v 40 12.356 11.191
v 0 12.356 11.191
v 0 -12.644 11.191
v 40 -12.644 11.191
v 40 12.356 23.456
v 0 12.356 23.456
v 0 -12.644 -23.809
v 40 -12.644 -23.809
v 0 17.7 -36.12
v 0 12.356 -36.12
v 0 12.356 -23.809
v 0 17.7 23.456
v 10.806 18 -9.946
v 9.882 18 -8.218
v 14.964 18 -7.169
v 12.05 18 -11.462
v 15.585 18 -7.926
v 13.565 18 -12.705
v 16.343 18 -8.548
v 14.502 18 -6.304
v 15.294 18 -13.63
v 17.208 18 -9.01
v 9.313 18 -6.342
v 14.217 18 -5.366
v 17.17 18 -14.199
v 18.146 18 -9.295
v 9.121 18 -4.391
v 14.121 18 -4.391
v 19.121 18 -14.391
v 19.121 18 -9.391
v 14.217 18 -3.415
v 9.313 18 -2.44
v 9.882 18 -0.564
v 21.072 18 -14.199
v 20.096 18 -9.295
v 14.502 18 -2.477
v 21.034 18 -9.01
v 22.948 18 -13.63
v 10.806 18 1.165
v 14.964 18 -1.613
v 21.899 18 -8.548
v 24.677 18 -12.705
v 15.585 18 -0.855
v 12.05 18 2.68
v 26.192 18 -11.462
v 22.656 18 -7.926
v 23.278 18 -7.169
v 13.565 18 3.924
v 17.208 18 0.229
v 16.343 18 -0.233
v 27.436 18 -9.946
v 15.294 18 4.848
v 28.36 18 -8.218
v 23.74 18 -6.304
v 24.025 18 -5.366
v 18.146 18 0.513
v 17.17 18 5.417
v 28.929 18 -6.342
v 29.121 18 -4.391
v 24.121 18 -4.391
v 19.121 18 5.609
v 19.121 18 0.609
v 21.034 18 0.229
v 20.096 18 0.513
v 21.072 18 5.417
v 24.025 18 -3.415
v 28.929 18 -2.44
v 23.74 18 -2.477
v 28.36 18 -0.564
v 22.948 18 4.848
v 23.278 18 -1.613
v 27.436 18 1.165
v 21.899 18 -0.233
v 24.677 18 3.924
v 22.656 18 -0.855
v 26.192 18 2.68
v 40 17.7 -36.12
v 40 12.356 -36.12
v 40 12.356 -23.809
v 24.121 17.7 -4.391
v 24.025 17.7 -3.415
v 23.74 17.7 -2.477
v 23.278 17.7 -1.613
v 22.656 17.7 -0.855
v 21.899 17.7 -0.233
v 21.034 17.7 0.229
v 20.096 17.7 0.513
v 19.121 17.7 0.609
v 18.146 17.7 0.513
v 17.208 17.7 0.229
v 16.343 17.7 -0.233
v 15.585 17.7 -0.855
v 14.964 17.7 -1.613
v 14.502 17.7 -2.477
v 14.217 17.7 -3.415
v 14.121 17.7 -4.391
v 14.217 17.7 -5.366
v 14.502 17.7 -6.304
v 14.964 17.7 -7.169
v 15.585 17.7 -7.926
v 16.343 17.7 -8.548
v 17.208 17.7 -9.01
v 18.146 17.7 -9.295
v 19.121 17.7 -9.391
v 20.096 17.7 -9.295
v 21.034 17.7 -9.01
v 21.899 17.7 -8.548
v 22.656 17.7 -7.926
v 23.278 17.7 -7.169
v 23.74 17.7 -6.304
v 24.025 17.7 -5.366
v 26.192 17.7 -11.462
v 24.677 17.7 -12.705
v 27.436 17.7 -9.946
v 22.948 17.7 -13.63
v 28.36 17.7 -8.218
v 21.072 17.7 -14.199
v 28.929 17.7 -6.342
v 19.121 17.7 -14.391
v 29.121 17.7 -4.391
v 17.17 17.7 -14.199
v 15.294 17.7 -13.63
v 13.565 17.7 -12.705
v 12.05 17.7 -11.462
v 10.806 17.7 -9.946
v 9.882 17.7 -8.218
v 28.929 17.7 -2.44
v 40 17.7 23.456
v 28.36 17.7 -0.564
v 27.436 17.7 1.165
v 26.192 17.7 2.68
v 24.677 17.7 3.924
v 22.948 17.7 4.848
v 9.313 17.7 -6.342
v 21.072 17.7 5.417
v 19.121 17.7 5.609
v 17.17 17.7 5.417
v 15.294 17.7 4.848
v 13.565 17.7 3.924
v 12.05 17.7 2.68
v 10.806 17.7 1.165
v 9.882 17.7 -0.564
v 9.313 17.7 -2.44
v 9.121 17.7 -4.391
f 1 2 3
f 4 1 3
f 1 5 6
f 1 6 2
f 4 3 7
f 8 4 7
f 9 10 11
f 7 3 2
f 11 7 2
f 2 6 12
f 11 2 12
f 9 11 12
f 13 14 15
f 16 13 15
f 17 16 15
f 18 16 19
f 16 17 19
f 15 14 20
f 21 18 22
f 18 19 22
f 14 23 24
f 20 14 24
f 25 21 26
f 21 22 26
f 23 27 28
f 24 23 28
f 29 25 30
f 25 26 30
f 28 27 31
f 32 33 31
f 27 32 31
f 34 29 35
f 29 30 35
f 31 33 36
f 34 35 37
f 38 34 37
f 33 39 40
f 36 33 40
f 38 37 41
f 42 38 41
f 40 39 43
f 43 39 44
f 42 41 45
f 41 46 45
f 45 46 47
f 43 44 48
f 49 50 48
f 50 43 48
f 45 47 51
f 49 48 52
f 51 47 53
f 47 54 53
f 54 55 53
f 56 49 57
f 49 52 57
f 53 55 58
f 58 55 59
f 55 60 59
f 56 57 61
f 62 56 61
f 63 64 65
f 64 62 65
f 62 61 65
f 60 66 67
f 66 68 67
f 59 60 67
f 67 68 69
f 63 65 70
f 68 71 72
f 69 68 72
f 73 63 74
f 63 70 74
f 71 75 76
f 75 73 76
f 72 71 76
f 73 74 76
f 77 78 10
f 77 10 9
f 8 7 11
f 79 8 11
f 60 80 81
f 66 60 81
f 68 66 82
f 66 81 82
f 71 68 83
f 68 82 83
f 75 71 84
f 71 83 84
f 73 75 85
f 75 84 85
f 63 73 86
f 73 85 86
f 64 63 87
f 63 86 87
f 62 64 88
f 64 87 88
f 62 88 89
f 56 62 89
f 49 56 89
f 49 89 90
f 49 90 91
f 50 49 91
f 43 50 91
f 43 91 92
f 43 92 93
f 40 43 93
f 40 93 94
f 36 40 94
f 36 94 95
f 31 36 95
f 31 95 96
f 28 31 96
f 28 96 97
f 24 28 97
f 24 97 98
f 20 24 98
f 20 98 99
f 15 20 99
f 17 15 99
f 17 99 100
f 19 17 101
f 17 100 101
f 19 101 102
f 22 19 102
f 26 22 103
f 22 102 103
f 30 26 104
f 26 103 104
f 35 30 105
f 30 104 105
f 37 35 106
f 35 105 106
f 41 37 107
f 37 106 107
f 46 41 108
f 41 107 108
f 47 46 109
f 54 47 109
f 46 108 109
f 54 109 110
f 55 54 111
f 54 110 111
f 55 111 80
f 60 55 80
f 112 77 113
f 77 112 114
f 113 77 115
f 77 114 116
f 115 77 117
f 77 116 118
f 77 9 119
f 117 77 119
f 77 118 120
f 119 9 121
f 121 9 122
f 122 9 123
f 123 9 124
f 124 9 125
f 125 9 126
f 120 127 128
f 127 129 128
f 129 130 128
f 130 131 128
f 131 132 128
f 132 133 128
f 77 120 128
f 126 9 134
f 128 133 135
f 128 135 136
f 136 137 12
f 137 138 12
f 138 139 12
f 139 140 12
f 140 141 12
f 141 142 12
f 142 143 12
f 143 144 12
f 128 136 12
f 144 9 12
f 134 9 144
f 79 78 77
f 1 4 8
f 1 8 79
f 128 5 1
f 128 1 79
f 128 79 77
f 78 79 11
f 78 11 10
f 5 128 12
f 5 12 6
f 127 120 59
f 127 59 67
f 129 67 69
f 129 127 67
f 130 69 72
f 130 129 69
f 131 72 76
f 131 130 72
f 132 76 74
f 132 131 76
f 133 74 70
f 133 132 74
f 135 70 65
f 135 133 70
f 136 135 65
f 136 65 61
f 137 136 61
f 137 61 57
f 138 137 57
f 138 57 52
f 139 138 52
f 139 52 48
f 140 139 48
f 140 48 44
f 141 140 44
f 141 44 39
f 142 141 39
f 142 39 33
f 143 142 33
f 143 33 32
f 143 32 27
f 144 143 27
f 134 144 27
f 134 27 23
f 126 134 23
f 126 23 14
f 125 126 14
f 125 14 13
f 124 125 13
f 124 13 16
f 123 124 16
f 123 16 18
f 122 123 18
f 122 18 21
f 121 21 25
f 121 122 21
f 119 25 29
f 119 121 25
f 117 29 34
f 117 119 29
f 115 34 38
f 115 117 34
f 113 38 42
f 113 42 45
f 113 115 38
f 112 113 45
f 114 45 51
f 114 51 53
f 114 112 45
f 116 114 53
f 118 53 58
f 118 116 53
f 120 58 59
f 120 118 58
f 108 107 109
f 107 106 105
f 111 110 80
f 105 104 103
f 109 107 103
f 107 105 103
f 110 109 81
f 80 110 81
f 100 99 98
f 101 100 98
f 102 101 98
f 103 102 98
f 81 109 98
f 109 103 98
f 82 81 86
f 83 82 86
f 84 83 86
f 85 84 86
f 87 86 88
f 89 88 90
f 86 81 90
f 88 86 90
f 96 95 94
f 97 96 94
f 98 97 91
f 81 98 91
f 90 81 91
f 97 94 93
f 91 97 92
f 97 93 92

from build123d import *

# Parameters (mm, degrees)
F1_DEPTH  = 40
F2_R      = 10
F2_R_2    = 5
F1_FACE_W = 40
F1_FACE_H = 35
F3_DEPTH  = 18


with BuildPart() as f1:
    # F0 (on Right) → F1 (new body)
    with BuildSketch(Plane.YZ):
        Polygon((12.356097, 23.456169), (12.356097, 11.191107), (-12.643903, 11.191107), (-12.643903, -23.808893), (12.356097, -23.808893), (12.356097, -36.119621), (17.700054, -36.119621), (17.700054, 23.456169), align=None)
    extrude(amount=F1_DEPTH)

    # F2 (on Front) + F1_face (on face) → F3 (join)
    with BuildSketch(Plane.XZ):
        with Locations((19.120954, -4.390738)):
            Circle(F2_R)
        with Locations((19.120954, -4.390738)):
            Circle(F2_R_2, mode=Mode.SUBTRACT)
    with BuildSketch(Plane(origin=(20, -12.643903, -6.308893), x_dir=(1, 0, 0), z_dir=(0, -1, 0))):
        Rectangle(F1_FACE_W, F1_FACE_H)
    extrude(amount=-F3_DEPTH)


solid = f1.part
